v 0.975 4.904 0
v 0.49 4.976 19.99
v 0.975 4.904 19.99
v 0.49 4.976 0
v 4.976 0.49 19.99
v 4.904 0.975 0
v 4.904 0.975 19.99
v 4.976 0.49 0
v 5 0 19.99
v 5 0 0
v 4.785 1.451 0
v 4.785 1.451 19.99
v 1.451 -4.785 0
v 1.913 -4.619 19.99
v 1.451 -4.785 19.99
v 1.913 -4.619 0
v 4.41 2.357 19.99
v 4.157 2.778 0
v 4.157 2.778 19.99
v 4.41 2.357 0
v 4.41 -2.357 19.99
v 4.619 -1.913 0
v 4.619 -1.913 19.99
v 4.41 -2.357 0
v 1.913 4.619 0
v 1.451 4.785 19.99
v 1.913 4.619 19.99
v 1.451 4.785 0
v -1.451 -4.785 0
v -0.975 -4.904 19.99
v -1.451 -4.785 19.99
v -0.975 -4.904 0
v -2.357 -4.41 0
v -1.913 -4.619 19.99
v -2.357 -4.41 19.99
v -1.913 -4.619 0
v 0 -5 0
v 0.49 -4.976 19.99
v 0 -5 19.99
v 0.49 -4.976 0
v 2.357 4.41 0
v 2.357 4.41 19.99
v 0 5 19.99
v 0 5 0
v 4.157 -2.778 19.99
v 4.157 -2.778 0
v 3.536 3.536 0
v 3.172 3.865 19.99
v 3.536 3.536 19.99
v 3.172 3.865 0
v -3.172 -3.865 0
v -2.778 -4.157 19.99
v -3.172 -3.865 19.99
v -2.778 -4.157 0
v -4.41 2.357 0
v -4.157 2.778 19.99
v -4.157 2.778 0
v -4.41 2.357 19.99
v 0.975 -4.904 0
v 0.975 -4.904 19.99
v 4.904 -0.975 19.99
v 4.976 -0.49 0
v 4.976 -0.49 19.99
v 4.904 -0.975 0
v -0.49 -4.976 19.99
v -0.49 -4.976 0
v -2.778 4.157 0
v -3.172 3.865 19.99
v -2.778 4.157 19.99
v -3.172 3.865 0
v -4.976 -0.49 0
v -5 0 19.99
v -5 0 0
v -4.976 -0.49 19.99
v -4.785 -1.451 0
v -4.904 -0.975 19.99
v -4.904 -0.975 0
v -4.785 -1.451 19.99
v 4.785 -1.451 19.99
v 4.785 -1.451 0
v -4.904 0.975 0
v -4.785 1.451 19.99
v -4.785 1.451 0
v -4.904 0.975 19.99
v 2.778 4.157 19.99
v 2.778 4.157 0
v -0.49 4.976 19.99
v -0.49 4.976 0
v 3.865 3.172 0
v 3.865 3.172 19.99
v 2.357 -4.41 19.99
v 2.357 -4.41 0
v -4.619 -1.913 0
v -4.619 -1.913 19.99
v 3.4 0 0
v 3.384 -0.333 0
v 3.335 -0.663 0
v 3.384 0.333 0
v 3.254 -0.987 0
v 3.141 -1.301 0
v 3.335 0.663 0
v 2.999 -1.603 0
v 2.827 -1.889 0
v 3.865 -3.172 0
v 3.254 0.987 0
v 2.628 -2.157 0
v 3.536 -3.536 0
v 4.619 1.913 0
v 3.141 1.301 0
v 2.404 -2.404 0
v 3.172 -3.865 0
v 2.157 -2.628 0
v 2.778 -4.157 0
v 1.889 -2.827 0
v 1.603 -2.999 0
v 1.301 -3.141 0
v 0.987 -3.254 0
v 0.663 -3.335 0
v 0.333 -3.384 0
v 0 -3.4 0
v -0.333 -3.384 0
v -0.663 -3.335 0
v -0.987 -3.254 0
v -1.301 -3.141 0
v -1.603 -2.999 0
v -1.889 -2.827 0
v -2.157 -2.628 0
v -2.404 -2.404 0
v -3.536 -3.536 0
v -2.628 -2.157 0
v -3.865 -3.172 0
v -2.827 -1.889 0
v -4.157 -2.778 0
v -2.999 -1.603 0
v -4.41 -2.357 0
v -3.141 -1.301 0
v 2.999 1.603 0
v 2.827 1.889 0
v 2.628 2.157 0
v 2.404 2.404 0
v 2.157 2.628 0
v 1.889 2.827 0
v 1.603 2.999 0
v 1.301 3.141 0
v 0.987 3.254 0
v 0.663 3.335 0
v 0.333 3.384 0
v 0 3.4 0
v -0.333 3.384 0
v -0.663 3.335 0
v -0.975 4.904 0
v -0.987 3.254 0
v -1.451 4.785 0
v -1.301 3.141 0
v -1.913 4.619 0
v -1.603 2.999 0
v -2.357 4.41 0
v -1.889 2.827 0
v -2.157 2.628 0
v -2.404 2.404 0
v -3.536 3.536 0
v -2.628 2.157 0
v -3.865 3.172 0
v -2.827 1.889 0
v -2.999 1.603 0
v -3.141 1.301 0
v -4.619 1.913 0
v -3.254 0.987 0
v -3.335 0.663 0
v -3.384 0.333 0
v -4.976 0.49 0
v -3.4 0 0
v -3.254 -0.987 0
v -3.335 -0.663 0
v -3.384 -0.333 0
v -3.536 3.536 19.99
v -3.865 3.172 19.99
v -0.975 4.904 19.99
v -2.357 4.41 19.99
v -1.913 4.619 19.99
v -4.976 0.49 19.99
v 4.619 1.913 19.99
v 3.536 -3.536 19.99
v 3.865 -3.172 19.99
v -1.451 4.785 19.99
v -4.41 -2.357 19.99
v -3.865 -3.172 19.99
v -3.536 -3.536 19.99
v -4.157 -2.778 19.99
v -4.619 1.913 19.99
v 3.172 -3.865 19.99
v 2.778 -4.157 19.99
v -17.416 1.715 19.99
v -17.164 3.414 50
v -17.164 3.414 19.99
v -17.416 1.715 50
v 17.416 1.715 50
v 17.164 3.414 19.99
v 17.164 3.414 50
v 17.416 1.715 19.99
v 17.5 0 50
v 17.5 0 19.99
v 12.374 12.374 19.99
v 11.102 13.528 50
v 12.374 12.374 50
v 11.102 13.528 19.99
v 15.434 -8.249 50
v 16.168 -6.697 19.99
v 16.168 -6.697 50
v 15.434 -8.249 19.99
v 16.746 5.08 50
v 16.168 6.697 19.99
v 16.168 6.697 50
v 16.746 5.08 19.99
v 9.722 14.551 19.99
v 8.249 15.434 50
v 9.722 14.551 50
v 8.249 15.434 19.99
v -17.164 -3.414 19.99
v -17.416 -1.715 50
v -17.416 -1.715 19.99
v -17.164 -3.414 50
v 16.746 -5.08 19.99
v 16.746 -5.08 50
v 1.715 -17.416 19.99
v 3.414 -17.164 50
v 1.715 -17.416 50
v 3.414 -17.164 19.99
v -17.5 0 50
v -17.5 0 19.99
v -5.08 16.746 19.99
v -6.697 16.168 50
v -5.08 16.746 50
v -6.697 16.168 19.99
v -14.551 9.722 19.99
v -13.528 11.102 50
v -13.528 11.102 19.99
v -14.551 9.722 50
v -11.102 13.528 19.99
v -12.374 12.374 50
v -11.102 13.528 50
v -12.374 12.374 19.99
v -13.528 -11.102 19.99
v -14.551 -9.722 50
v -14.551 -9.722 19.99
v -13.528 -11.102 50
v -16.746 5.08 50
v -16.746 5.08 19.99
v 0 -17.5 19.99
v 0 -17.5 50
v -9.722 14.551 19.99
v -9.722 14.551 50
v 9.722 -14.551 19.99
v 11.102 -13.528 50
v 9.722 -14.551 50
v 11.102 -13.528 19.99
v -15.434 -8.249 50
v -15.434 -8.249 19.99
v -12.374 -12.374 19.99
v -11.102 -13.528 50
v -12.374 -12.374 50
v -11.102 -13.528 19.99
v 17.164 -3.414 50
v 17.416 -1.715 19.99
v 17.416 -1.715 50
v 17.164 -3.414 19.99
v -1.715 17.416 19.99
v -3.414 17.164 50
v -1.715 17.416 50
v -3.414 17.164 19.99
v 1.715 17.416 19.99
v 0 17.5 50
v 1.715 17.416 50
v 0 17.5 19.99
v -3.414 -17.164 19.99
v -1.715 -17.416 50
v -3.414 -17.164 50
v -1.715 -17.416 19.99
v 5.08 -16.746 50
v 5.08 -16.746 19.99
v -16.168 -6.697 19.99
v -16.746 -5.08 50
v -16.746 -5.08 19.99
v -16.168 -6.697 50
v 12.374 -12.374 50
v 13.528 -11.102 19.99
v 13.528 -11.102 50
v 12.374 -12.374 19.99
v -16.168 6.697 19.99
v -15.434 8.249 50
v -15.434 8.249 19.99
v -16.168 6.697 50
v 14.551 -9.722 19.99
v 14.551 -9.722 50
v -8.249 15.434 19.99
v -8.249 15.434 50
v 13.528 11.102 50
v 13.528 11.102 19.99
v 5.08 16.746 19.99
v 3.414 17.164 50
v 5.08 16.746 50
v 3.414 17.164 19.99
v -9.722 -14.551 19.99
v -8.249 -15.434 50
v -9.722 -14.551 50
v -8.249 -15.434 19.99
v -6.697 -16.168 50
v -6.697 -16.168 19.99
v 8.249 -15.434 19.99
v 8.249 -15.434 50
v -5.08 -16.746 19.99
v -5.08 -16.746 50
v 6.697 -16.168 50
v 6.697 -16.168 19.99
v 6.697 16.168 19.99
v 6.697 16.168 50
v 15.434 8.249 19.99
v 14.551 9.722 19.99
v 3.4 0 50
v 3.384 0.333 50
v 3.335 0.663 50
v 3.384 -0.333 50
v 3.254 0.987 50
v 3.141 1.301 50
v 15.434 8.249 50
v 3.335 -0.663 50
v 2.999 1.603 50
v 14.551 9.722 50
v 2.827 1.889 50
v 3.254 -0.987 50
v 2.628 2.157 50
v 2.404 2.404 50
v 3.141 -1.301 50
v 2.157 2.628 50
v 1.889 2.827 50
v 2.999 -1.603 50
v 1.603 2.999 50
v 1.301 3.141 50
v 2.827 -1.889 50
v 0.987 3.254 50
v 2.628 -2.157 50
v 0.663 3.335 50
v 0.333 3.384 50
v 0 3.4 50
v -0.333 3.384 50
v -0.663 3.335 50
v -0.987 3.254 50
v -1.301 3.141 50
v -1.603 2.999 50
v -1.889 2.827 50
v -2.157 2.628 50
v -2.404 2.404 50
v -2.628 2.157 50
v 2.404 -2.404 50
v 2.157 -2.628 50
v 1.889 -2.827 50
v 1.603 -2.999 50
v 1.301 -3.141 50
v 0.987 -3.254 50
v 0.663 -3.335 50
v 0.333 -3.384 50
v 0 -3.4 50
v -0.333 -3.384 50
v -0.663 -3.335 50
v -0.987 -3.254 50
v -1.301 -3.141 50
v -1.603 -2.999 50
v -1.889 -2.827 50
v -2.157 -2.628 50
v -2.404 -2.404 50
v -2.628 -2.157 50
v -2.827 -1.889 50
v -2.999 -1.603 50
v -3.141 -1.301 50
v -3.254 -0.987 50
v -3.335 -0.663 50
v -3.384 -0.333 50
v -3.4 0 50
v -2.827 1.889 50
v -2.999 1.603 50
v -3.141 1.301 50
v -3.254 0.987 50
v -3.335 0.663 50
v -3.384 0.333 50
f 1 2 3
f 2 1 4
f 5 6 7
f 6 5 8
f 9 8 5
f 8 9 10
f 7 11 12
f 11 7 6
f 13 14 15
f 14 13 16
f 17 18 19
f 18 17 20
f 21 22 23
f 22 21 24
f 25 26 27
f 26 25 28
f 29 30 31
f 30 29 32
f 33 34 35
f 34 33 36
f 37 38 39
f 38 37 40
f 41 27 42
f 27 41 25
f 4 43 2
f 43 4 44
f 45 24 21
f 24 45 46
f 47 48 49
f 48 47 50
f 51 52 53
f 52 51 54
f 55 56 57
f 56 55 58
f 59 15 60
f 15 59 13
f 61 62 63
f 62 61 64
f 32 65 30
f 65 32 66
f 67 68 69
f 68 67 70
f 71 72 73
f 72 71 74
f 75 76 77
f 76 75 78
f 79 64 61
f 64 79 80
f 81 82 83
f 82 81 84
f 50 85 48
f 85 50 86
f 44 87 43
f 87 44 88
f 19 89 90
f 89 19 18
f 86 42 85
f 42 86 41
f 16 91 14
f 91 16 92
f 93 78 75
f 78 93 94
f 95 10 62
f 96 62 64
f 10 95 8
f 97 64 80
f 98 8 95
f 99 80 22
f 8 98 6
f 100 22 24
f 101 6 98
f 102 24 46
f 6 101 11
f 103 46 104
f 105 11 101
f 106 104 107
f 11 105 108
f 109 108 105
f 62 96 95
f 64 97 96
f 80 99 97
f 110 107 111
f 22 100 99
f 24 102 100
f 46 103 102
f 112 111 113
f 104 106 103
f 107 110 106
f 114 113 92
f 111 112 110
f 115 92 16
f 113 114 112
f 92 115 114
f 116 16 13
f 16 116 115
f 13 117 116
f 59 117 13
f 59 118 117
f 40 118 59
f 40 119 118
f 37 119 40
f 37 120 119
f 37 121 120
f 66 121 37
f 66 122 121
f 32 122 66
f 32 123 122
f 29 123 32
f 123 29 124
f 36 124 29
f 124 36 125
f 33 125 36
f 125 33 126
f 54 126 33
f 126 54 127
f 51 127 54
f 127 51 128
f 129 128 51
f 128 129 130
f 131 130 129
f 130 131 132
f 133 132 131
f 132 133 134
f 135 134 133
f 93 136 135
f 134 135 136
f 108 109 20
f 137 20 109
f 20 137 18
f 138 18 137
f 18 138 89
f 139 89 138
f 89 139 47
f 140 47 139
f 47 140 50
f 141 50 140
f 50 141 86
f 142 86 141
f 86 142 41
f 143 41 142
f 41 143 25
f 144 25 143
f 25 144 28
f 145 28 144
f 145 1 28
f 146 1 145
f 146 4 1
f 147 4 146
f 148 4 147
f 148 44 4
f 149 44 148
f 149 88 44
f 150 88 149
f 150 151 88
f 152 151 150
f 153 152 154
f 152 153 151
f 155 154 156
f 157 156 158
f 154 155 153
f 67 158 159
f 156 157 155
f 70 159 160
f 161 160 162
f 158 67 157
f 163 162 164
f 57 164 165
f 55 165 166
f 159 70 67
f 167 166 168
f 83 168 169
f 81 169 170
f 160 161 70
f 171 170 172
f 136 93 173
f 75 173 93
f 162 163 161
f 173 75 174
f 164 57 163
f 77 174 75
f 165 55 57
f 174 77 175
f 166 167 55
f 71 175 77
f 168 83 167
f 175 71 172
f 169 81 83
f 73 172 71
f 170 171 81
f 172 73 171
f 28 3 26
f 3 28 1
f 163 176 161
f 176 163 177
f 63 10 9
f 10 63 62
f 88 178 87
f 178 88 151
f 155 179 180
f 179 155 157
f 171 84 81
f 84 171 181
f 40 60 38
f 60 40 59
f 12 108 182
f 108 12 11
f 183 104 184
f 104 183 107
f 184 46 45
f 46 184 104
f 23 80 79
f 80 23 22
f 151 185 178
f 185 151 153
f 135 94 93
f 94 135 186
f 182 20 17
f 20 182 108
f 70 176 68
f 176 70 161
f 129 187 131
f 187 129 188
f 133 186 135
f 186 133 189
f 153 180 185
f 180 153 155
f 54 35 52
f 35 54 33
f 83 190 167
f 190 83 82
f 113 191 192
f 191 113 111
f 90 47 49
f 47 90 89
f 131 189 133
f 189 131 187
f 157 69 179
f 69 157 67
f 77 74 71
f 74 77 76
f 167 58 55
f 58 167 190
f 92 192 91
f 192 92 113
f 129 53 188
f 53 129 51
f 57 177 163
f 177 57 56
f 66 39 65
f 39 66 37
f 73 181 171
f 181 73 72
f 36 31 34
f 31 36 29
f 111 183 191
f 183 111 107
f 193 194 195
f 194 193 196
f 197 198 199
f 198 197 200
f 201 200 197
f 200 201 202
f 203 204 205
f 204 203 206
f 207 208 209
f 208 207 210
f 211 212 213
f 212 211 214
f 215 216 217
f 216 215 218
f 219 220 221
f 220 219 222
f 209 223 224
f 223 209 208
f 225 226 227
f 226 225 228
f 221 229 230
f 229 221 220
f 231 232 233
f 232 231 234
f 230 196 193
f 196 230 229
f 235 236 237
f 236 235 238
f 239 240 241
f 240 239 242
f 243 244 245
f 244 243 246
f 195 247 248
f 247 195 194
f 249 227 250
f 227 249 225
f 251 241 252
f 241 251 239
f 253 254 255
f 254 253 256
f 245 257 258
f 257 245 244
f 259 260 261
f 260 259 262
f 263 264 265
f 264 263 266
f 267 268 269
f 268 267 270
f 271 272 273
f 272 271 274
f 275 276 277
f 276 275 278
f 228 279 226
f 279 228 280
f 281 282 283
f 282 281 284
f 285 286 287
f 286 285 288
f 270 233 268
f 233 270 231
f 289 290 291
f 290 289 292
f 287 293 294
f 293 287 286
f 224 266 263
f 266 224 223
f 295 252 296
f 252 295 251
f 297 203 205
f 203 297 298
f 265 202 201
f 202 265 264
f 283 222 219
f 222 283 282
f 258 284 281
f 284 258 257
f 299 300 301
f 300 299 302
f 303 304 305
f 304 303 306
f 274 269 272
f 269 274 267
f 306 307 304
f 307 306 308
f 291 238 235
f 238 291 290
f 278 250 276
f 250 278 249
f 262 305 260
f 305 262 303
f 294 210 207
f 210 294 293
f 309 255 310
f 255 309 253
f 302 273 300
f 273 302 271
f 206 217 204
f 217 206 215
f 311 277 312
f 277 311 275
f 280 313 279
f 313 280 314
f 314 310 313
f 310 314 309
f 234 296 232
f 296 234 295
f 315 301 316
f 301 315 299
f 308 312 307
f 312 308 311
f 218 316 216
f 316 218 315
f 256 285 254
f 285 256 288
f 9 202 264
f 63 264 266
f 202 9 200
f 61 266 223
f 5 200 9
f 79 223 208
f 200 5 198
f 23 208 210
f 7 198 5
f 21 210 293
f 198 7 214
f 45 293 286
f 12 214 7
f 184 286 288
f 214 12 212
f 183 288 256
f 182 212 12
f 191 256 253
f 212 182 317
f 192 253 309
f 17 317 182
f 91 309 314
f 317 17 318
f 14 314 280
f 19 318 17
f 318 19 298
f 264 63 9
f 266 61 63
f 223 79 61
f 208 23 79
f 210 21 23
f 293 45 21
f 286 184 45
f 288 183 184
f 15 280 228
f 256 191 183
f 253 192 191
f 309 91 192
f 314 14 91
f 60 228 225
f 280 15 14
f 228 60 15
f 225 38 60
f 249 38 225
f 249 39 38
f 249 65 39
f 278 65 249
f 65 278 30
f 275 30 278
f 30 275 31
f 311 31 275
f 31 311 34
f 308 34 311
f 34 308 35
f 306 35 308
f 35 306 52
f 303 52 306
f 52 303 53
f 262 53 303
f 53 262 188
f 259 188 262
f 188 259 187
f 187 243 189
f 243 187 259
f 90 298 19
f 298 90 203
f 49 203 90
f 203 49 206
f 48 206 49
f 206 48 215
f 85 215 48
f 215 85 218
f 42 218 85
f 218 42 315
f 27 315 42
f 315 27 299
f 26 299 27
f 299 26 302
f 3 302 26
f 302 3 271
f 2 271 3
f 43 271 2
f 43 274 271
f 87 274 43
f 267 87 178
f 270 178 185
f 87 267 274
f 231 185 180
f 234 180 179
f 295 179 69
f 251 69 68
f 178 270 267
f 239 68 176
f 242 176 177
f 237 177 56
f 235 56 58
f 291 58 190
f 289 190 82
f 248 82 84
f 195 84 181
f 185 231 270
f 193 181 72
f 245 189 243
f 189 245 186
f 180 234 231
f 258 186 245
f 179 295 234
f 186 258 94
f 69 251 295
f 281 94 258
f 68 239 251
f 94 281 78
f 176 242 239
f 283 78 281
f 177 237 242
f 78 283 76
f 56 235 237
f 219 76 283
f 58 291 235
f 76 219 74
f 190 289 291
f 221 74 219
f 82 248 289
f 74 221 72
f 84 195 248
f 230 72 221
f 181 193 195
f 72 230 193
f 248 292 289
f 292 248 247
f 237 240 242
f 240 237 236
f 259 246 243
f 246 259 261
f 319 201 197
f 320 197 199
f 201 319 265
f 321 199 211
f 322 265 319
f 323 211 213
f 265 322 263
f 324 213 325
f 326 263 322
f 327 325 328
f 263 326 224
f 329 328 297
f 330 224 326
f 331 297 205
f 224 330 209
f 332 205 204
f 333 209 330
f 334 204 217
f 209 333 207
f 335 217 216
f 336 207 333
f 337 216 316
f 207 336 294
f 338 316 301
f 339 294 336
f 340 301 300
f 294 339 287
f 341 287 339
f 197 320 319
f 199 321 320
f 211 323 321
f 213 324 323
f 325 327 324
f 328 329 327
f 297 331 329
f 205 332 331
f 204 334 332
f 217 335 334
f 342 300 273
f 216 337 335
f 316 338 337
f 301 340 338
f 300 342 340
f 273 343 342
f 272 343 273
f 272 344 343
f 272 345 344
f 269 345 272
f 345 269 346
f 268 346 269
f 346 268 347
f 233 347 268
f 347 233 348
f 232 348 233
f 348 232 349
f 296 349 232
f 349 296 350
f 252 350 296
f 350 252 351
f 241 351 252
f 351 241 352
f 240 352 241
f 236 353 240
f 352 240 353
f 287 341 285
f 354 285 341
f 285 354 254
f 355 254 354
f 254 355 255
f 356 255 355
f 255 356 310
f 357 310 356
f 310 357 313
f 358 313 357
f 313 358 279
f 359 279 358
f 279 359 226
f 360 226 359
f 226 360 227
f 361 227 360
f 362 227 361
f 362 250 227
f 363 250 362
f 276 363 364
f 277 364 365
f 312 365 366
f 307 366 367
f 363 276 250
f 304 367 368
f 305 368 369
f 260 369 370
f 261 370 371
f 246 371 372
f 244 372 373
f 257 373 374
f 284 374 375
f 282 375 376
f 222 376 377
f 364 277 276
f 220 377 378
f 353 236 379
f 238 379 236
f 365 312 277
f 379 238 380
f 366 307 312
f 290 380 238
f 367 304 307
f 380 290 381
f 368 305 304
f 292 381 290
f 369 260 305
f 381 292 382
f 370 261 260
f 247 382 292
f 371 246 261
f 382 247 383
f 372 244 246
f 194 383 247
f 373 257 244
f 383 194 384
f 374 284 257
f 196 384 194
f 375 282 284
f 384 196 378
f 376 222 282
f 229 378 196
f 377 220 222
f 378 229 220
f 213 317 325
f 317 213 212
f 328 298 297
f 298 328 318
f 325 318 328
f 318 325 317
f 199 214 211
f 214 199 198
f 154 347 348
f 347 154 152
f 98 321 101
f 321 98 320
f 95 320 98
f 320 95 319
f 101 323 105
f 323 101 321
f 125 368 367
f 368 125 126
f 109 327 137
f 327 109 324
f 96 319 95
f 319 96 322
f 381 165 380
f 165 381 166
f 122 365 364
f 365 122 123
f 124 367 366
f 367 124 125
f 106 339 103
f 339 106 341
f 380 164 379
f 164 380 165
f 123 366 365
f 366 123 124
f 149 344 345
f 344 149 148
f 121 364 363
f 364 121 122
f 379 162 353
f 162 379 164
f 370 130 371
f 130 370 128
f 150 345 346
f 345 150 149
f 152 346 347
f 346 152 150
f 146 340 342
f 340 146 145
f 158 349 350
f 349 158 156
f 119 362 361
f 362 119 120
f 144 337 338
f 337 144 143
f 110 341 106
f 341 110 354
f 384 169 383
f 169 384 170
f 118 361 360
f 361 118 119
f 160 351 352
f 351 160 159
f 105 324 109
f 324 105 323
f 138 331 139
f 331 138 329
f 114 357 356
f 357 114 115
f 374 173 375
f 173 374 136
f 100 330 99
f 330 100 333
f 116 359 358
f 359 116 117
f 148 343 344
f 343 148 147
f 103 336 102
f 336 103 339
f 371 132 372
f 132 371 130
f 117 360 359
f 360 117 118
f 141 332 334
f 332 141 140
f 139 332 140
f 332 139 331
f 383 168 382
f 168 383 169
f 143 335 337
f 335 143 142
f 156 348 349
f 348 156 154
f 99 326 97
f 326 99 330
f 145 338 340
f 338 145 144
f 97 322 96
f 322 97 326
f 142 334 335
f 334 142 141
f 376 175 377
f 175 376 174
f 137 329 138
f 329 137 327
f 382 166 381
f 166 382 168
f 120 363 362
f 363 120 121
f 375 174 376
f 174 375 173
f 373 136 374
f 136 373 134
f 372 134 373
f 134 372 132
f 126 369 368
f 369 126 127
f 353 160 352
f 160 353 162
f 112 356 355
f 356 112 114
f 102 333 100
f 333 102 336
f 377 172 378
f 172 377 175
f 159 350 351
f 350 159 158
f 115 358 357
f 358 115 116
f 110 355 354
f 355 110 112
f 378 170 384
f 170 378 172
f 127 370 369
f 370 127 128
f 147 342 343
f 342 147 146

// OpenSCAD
// Lab funnel - printed upright with wide opening at the top
// Units: mm

// ---- Parameters ----
spout_od        = 10;    // spout outer diameter
spout_h         = 20;    // spout height (z = 0 to 20)
cone_od_bottom  = 10;    // cone outer diameter at z = 20
cone_od_top     = 60;    // cone outer diameter at rim (z = 50)
cone_top_z      = 50;    // rim height
wall            = 1.6;   // wall thickness everywhere
eps             = 0.5;   // cutter overshoot

$fn = 64;

// ---- Derived ----
spout_id = spout_od - 2*wall;   // 6.8 mm bore
cone_h   = cone_top_z - spout_h;

// ---- Model ----
difference() {
    union() {
        // Spout
        cylinder(d = spout_od, h = spout_h);
        // Cone (slightly overlapping spout for a clean union)
        translate([0, 0, spout_h - 0.01])
            linear_extrude(height = cone_h + 0.01)
                circle(d = (cone_od_bottom + cone_od_top) / 2);
    }
    // Through-cut: straight axis from bottom to top
    translate([0, 0, -eps])
        cylinder(h = cone_top_z + 2*eps, d = spout_id);
}
